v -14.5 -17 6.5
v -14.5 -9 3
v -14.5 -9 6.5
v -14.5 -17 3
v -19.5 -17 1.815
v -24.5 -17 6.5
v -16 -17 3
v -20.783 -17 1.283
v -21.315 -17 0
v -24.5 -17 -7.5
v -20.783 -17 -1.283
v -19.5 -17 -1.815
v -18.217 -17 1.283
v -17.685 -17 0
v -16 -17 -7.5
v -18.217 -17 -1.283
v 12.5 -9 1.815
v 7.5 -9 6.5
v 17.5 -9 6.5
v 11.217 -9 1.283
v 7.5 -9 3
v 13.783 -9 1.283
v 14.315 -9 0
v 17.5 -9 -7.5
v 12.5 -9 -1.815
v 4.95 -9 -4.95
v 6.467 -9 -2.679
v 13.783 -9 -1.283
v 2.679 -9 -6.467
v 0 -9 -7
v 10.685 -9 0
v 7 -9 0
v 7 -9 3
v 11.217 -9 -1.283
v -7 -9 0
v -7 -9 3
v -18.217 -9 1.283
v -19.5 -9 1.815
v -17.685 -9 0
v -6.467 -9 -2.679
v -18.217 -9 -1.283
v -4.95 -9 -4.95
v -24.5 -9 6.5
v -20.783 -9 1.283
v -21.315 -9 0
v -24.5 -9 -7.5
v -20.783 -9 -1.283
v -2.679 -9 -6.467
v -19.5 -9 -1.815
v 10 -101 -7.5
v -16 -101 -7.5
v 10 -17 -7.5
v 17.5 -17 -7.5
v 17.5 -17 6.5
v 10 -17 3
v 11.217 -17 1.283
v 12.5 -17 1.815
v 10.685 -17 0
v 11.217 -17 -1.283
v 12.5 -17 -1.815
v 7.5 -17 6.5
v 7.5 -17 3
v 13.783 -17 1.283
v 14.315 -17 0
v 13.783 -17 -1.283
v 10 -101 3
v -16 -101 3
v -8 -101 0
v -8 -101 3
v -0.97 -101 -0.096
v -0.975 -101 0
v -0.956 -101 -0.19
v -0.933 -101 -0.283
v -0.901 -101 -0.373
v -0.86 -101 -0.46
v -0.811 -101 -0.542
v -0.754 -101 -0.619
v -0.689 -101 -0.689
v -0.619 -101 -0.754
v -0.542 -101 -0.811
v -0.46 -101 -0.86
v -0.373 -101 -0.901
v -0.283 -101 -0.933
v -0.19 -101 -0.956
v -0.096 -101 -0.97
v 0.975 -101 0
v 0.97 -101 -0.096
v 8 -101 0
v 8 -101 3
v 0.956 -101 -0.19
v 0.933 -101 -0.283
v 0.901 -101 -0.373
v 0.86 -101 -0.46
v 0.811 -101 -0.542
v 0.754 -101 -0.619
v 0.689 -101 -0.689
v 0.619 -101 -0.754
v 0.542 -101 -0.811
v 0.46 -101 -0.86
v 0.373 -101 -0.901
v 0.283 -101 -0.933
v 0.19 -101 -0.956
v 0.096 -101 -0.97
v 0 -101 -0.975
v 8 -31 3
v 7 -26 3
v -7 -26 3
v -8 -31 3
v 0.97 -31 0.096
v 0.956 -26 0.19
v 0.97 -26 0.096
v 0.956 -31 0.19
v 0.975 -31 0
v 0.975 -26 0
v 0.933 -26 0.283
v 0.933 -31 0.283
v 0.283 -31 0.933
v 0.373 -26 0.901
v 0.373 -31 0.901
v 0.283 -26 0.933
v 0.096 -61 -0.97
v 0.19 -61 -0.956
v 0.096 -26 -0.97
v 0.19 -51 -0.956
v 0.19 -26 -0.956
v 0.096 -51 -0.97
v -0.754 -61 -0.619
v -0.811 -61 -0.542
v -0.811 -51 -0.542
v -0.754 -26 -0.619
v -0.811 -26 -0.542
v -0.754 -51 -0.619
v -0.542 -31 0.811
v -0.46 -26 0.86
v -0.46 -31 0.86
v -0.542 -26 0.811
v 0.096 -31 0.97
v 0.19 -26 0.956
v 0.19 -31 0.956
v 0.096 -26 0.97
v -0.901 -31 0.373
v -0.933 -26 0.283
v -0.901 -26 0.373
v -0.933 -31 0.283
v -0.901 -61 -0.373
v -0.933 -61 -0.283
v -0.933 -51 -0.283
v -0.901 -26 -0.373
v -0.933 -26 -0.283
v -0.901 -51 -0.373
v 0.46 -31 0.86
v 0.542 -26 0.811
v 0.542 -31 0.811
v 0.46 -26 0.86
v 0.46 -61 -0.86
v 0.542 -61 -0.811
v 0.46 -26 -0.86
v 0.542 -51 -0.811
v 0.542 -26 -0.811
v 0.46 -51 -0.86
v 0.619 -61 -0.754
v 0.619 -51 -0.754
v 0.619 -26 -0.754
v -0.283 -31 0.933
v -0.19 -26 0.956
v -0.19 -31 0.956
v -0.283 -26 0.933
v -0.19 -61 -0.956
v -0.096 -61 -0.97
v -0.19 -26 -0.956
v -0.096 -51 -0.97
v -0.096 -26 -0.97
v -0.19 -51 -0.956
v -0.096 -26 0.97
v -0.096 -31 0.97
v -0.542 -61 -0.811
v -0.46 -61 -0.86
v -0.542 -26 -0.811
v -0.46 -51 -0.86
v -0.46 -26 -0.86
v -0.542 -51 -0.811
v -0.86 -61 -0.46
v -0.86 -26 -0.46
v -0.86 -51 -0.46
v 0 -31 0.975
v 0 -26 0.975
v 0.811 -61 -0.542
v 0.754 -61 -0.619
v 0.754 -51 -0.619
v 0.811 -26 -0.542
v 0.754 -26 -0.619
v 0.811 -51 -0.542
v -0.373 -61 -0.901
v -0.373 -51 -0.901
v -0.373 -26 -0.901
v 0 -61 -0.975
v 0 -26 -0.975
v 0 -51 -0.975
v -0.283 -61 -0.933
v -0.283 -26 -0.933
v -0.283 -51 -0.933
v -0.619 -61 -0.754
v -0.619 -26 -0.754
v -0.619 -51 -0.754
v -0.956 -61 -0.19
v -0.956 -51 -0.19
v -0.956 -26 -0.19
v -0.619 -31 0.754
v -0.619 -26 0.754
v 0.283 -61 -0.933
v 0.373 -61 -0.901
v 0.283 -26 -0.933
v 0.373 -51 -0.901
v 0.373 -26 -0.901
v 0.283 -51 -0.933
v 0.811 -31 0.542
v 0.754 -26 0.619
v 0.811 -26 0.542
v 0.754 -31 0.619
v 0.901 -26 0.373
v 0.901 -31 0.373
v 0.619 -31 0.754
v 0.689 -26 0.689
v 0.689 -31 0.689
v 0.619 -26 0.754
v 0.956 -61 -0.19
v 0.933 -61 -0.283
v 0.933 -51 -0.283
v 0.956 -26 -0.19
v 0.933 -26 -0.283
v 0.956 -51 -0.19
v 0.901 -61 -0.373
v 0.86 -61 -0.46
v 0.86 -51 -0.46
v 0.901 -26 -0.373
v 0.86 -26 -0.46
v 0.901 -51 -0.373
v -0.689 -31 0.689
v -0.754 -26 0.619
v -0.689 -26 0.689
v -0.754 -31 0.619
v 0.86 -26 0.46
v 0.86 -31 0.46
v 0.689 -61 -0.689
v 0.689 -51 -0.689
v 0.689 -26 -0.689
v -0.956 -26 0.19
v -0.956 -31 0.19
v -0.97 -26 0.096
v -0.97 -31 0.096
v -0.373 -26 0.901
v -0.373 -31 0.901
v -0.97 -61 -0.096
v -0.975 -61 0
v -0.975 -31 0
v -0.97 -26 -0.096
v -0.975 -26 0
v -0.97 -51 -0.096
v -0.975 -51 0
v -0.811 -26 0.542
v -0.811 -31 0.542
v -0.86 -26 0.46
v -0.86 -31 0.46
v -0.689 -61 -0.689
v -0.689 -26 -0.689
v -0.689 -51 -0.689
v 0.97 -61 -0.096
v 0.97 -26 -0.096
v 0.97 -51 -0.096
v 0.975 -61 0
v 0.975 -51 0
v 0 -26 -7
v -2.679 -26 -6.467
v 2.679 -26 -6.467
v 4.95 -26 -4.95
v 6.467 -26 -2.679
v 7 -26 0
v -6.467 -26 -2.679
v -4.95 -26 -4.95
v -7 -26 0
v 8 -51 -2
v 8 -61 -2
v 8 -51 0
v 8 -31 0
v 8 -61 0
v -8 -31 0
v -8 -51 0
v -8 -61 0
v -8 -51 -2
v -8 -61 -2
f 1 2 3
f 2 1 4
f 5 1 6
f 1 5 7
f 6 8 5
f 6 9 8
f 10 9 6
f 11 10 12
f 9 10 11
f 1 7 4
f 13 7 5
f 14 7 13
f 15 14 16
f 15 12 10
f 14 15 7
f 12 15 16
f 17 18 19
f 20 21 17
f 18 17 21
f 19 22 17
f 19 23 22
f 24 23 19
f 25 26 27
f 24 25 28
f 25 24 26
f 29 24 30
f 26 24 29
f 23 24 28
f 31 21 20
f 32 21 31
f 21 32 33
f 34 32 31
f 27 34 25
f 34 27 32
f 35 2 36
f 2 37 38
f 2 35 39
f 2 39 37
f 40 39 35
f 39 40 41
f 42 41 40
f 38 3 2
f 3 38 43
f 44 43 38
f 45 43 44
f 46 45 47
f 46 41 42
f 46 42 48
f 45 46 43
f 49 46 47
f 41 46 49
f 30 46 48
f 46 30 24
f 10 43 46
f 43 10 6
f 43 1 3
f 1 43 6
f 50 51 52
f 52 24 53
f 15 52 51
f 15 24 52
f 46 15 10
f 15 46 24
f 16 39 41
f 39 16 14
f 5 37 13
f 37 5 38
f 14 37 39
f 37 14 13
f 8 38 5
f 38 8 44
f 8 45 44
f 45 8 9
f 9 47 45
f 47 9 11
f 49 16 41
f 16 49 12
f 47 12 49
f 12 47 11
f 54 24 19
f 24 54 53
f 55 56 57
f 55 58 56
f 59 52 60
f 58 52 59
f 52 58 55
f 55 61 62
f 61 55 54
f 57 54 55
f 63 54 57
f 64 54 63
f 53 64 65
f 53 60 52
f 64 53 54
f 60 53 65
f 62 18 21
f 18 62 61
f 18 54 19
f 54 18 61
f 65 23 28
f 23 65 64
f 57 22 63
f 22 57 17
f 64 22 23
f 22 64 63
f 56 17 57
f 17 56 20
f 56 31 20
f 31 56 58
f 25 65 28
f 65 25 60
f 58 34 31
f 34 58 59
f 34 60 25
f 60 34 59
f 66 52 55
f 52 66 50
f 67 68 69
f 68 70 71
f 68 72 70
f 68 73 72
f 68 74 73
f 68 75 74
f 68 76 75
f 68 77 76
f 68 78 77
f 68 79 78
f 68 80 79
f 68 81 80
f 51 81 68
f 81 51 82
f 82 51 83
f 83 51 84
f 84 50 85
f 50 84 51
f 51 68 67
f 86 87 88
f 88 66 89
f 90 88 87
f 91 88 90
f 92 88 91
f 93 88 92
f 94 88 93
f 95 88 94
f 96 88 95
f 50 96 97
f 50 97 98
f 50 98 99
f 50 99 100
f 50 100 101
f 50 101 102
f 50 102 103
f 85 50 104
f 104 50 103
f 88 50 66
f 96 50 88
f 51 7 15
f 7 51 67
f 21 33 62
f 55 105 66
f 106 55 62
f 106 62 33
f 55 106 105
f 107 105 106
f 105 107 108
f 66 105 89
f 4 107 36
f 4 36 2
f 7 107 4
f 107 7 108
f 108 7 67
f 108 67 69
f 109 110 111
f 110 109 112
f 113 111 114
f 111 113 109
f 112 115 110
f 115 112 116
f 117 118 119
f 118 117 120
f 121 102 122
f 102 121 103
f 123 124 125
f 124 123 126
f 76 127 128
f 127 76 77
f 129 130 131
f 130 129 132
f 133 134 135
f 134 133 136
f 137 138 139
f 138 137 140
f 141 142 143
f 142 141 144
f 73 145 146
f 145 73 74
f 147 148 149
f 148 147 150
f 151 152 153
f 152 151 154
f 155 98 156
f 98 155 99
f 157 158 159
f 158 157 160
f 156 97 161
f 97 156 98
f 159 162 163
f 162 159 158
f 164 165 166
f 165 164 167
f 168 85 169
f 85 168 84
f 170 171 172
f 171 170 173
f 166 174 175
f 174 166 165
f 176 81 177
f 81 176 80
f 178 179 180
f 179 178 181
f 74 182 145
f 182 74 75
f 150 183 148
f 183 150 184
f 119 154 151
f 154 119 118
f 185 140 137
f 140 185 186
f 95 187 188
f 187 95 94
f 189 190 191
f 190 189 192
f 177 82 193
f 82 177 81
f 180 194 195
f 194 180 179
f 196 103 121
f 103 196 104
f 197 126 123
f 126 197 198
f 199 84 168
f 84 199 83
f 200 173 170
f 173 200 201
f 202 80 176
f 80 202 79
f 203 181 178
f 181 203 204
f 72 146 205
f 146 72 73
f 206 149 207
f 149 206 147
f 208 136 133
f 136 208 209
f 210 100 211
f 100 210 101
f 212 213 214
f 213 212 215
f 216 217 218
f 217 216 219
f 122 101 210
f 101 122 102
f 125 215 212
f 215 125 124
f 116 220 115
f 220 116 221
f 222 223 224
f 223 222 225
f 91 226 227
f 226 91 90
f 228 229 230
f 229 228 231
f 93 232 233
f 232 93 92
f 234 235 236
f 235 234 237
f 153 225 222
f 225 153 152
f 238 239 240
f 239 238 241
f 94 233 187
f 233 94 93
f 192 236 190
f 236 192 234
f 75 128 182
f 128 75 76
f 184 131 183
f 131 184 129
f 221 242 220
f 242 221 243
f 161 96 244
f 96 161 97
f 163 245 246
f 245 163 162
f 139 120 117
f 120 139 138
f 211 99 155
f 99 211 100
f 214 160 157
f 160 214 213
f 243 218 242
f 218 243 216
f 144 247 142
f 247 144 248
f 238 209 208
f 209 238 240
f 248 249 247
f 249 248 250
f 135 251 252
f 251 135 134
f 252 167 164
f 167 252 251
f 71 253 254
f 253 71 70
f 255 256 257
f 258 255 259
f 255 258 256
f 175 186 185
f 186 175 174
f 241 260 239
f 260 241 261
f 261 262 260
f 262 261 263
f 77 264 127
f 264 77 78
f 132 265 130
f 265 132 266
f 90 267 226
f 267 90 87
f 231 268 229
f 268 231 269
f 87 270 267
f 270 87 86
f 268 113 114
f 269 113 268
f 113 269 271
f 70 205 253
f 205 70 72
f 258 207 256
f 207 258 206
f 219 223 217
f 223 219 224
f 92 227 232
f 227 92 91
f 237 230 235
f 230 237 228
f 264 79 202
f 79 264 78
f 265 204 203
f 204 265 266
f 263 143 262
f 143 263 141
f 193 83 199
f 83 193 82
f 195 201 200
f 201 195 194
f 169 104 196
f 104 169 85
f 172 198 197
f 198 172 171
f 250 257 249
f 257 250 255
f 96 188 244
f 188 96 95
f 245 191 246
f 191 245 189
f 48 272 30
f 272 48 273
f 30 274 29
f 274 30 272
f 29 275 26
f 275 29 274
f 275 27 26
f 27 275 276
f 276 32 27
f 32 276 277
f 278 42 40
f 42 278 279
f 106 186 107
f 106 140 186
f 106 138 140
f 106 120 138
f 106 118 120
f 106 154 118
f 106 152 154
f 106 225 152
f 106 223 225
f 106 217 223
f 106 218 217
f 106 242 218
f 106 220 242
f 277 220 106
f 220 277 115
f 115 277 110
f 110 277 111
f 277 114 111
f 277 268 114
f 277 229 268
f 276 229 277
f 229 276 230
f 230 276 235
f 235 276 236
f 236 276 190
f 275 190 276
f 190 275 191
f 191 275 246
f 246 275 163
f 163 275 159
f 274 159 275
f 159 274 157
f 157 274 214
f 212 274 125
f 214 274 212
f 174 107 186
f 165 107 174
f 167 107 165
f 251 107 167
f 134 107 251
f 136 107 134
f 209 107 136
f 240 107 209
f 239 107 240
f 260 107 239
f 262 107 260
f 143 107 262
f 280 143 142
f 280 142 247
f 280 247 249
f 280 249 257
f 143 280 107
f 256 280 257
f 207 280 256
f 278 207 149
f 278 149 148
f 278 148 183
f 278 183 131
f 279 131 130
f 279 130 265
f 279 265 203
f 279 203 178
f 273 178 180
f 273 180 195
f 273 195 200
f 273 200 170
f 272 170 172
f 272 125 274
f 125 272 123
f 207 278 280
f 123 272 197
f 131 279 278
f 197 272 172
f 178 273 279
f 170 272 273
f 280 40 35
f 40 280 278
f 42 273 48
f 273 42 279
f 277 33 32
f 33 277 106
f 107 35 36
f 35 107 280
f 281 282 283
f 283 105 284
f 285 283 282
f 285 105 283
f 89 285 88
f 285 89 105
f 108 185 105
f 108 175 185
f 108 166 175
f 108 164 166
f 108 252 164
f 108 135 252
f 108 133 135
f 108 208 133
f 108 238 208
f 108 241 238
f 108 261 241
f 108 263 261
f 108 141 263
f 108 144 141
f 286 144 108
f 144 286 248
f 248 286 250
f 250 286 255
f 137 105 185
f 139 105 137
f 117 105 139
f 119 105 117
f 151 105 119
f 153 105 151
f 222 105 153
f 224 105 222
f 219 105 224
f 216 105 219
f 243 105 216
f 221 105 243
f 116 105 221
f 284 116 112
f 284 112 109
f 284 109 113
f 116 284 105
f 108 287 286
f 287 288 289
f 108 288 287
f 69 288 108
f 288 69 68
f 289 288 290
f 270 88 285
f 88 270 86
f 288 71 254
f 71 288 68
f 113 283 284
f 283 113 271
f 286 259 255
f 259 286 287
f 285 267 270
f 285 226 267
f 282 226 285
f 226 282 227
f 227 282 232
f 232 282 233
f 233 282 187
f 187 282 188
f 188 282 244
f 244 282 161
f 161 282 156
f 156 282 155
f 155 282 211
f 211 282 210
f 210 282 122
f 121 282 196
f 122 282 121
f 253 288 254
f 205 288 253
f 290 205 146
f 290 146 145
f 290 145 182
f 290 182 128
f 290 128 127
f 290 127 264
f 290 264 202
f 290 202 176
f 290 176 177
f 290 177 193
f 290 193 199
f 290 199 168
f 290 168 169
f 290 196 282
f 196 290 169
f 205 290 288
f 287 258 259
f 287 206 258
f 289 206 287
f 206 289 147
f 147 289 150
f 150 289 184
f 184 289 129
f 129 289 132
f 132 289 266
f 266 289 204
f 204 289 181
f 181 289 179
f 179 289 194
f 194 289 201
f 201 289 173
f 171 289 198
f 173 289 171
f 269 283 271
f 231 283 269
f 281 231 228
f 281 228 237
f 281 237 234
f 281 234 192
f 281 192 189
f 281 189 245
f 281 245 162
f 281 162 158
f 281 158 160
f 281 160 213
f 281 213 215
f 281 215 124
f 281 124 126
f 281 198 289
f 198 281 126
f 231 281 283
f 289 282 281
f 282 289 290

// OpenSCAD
/* [Filament] */

//Filament Diameter
filament_dia=1.75+0.2;

/* [Mounting Holes] */

//Mount Hole Diameter
mount_hole_dia=3.63;
mount_hole_offset_left=19.5;
mount_hole_offset_right=12.5;
mounting_block_left_width=10;
mounting_block_right_width=10;

/* [Caliper Area Settings] */
measurable_length=20;
caliper_rest_length=50;
filament_guide_length=5;
bowden_coupler_length=17;

rotate([90,0,0]){
	difference(){
		translate([-mount_hole_offset_left-(mounting_block_left_width/2),-7.5,9])cube([mounting_block_left_width,14,8]);
		color("red")translate([-mount_hole_offset_left,0,0])cylinder(d=mount_hole_dia,h=30,$fn=8);
	}
	difference(){
		translate([mount_hole_offset_right-(mounting_block_right_width/2),-7.5,9])cube([mounting_block_right_width,14,8]);
		color("red")translate([mount_hole_offset_right,0,0])cylinder(d=mount_hole_dia,h=30,$fn=8);
	}
	difference(){
		color("orange")translate([-16,-7.5,9])cube([26,7.5+3,14+8+measurable_length+caliper_rest_length]);//Base
		color("blue")translate([0,0,9])cylinder(d=filament_dia,h=14+8+measurable_length+caliper_rest_length,$fn=64);//Filament
		color("blue")cylinder(d=14,h=9+bowden_coupler_length,$fn=16);//bowden coupler
		color("green")translate([-7,0,0])cube([14,14,9+bowden_coupler_length]);
		color("black")translate([-(16/2),0,9+bowden_coupler_length+filament_guide_length])cube([16,3,measurable_length+caliper_rest_length]);//Caliper Slot
		color("red")translate([-(16/2),-2,9+bowden_coupler_length+filament_guide_length+measurable_length])cube([16,5,10]);//Caliper Slot Lower bit
		}
}


